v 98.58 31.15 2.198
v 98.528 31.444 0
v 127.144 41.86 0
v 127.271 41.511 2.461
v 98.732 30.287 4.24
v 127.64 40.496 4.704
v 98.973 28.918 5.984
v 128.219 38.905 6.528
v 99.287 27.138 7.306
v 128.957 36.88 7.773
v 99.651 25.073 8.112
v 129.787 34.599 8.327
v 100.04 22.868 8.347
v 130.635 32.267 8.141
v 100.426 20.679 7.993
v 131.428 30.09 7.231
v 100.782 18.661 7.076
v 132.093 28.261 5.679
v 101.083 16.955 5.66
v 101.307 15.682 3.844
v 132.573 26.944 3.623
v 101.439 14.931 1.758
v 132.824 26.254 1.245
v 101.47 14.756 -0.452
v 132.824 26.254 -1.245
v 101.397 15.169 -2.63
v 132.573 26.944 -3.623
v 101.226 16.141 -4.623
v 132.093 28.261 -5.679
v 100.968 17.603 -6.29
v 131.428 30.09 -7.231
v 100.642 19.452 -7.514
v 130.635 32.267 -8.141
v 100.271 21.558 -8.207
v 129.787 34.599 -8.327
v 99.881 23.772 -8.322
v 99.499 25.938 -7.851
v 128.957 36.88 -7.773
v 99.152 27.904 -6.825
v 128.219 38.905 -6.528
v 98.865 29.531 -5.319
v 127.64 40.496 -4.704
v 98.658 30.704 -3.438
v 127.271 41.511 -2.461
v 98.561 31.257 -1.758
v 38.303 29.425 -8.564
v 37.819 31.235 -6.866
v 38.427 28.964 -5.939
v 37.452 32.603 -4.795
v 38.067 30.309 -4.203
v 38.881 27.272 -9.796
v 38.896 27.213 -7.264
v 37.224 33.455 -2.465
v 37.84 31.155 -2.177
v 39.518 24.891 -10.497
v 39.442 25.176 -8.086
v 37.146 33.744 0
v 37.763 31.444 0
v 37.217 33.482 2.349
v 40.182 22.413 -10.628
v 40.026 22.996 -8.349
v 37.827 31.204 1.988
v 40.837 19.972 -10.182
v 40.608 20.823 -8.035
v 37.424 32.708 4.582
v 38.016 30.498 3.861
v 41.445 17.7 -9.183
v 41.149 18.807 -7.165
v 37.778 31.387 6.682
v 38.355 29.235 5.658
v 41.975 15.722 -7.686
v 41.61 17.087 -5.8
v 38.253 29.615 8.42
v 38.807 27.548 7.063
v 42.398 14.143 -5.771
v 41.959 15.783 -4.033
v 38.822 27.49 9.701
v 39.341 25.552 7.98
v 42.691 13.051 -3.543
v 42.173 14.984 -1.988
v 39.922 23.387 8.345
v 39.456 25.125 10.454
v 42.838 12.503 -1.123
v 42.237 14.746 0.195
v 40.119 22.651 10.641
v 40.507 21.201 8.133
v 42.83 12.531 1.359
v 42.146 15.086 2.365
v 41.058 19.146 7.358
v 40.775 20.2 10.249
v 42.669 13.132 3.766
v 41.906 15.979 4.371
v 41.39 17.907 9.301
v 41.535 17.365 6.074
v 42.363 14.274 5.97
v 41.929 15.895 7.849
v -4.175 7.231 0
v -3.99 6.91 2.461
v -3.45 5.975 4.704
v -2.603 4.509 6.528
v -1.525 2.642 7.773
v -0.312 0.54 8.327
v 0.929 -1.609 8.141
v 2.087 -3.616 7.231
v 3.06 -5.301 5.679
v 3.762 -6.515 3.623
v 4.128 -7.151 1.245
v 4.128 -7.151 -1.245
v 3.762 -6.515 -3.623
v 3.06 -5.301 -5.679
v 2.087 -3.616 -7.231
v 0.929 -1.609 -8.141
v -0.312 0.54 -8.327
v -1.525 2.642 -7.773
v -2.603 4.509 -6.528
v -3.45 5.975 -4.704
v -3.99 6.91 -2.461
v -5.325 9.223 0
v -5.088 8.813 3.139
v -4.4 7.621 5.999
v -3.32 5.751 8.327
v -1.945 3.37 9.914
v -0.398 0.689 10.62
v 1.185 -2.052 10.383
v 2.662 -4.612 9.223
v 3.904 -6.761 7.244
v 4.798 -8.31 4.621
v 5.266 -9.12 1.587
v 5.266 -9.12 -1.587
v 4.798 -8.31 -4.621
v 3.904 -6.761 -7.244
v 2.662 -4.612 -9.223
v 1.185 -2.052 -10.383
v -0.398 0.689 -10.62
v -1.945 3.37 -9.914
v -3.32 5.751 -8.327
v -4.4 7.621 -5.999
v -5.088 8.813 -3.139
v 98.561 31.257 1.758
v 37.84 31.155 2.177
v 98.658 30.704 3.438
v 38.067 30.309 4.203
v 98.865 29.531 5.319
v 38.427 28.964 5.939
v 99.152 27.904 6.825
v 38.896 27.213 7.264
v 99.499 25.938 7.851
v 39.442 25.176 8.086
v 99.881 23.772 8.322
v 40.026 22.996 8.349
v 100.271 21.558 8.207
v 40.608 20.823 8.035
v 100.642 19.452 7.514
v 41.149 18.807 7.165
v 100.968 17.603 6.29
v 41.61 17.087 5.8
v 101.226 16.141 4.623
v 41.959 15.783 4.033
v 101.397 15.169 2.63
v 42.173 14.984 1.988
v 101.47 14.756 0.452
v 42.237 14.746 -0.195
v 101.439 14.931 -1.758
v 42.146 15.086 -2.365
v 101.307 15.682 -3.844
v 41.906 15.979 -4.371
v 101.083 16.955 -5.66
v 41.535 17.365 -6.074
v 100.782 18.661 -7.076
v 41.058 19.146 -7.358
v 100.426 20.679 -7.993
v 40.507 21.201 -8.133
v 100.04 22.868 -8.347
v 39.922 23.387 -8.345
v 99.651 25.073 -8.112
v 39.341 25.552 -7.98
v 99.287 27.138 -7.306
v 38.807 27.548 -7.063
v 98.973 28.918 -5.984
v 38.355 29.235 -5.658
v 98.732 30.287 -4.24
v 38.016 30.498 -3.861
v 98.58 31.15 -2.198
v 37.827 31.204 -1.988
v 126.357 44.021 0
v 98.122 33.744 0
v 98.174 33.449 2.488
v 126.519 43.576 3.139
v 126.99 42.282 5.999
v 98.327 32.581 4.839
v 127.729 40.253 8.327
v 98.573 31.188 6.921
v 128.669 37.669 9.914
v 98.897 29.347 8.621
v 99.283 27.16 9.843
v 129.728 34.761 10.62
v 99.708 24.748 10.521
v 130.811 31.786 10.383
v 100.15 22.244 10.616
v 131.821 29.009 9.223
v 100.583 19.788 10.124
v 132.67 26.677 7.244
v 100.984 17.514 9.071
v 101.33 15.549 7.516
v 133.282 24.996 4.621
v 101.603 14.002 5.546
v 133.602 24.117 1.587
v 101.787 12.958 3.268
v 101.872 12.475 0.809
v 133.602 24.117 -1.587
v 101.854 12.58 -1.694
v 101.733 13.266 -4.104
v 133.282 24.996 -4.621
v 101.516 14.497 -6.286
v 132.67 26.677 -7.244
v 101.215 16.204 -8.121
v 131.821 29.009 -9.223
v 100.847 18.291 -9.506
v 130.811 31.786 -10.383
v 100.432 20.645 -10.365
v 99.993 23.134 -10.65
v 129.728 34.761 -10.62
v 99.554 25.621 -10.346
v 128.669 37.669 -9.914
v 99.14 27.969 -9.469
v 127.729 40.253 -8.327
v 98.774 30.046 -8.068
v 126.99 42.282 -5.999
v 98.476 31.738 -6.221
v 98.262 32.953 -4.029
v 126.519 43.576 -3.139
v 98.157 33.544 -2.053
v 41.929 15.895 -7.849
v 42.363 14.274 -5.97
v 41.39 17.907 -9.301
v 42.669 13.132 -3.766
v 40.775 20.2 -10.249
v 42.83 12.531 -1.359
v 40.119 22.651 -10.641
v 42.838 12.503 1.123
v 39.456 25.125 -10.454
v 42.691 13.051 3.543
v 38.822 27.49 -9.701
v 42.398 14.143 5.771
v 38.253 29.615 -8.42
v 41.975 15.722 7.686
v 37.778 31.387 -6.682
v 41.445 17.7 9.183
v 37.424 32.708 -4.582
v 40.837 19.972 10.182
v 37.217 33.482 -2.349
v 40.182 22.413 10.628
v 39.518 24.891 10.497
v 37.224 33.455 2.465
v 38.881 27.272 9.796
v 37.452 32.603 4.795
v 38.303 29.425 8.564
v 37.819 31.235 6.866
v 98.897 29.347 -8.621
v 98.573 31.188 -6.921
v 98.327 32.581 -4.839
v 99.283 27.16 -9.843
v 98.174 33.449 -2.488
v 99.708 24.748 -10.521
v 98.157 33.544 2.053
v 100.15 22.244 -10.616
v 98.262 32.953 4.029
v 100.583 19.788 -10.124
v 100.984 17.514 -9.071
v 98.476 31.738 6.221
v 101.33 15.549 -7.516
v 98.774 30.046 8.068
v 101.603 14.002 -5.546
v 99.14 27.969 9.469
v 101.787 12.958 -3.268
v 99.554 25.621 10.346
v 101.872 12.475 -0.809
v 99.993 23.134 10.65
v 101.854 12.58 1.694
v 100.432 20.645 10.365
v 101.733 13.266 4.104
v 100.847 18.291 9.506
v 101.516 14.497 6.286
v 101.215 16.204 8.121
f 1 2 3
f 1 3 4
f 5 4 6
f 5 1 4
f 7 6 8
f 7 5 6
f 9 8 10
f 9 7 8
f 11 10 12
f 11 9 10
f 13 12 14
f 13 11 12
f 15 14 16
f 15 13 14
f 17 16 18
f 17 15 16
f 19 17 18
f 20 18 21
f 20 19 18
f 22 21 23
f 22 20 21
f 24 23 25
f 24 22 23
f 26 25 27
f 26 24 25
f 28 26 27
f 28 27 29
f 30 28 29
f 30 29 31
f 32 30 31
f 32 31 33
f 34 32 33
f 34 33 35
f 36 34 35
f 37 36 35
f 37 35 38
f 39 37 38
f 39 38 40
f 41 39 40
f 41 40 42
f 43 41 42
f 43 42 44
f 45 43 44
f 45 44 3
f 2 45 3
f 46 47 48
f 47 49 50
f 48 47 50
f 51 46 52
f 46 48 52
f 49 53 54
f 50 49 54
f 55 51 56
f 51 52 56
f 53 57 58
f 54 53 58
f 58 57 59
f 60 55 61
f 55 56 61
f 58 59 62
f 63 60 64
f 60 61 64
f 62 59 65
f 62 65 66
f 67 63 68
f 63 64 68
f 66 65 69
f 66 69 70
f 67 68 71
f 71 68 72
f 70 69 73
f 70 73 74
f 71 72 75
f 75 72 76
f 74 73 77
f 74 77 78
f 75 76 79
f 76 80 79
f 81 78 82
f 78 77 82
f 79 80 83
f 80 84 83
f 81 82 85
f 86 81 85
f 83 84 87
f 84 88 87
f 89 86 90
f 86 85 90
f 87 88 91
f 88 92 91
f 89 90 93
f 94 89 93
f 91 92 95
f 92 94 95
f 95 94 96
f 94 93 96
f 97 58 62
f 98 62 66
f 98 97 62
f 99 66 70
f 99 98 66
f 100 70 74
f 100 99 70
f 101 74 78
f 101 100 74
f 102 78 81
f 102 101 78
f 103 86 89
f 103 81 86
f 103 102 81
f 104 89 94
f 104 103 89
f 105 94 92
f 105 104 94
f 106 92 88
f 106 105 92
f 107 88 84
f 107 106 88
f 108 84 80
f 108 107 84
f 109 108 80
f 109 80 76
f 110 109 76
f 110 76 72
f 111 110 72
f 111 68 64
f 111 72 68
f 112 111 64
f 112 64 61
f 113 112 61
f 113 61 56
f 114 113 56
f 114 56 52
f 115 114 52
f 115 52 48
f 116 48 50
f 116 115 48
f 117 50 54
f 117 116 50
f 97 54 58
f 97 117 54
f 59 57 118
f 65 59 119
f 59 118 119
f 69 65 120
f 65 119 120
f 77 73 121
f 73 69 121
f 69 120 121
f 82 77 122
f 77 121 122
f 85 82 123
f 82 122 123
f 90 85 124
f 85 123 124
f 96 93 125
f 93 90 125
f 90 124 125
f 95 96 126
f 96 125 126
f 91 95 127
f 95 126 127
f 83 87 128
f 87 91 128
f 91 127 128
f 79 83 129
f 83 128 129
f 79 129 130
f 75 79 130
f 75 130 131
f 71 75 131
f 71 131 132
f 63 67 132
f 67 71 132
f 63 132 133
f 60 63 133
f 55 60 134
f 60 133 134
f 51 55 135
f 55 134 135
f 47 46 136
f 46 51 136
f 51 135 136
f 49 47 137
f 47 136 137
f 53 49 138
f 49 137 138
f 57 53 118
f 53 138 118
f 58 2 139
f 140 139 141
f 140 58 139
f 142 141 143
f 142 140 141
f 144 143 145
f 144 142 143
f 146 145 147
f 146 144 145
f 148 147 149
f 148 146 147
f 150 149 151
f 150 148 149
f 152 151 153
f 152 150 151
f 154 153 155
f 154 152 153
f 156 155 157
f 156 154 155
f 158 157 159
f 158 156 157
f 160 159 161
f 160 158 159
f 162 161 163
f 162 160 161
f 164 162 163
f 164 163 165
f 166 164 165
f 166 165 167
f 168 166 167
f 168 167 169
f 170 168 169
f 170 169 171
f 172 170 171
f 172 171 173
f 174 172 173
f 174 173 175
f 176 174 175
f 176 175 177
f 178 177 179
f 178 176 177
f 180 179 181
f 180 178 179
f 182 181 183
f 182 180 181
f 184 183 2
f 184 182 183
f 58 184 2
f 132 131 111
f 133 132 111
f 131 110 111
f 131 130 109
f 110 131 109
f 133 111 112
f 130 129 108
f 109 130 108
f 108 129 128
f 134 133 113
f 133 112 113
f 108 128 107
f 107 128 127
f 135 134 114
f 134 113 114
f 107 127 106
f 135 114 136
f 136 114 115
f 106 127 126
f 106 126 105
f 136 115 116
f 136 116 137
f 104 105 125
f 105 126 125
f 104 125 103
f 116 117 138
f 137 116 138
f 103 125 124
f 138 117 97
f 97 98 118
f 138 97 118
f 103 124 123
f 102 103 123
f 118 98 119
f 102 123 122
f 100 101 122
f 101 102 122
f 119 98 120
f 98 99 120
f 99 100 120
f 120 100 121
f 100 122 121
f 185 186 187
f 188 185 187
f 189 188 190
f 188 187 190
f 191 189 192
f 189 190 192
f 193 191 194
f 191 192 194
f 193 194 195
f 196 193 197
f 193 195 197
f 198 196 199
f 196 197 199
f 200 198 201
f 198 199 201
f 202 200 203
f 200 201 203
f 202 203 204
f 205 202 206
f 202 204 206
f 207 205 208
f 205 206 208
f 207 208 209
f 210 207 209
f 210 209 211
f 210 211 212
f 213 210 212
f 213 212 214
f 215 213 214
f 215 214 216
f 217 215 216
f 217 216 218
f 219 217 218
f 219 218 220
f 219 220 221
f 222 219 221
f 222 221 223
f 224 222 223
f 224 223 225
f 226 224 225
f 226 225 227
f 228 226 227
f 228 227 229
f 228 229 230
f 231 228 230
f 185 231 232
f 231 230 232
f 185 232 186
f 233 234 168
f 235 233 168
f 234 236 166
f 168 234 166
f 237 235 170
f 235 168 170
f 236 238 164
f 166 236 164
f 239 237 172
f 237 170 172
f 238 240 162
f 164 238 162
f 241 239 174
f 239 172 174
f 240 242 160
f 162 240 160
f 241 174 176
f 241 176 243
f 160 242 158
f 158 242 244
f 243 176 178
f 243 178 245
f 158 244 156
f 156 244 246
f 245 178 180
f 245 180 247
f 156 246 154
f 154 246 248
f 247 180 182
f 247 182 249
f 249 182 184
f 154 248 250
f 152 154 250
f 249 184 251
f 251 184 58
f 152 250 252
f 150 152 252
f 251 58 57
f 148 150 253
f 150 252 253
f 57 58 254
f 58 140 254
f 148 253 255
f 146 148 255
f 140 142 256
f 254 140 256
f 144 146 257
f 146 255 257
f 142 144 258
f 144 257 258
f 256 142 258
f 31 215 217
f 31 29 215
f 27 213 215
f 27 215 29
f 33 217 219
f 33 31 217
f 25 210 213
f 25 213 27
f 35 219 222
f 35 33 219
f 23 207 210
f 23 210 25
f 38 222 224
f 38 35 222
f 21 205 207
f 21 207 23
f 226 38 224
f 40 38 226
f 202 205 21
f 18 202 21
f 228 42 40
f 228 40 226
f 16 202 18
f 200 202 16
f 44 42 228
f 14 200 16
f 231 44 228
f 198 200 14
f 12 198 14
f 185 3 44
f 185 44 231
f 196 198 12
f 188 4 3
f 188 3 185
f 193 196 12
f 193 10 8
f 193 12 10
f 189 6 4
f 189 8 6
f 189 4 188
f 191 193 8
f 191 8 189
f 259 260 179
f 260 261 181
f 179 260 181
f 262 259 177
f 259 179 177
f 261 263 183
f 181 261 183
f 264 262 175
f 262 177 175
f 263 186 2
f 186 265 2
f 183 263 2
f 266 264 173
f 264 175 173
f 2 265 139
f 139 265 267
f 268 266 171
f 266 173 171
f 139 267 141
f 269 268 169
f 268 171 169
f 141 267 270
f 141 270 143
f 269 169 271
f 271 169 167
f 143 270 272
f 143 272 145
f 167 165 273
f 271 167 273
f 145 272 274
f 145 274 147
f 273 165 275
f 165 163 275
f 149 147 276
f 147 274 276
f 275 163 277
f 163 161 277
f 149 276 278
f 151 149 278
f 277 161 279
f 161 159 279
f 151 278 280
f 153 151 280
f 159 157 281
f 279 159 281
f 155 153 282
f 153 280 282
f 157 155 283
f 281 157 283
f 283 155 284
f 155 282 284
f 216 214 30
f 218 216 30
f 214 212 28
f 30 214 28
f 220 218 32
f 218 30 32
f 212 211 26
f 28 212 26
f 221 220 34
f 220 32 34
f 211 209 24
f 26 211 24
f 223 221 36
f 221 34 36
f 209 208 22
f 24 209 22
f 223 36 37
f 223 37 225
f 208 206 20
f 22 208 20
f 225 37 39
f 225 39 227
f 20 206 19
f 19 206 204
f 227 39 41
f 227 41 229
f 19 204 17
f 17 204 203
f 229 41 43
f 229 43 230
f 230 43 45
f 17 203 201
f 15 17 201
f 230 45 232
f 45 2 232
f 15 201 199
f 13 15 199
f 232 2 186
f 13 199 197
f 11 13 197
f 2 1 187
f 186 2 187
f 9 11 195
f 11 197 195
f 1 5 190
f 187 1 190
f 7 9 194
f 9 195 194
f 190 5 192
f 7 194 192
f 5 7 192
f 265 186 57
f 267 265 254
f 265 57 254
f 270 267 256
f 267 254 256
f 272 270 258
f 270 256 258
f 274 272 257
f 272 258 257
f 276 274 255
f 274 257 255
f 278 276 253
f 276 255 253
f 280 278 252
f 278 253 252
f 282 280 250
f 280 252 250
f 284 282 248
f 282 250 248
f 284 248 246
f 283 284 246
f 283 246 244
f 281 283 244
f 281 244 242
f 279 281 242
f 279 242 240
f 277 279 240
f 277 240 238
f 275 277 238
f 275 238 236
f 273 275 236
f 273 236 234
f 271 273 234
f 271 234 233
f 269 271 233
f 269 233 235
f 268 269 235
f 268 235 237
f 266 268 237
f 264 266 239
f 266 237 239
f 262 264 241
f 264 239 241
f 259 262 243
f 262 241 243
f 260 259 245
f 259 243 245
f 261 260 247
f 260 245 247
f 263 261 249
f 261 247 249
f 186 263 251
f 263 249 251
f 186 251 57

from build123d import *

# Parameters (mm, degrees)
SKETCH1_R                    = 10.65
SKETCH1_R_2                  = 8.35
TUBER_A_21_3_X_2_3_1_DEPTH   = 51.223704653
SKETCH1_ON_SEGMENT_2_R       = 10.65
SKETCH1_ON_SEGMENT_2_R_2     = 8.35
TUBER_A_21_3_X_2_3_1_2_DEPTH = 68.691409798
SKETCH1_ON_SEGMENT_3_R       = 10.65
SKETCH1_ON_SEGMENT_3_R_2     = 8.35
TUBER_A_21_3_X_2_3_1_3_DEPTH = 35.581059854


with BuildPart() as part:
    # Sketch1 → Tubería 21.3 X 2.3(1) (new body)
    with BuildSketch(Plane(origin=(0, 0, 0), x_dir=(-0.5, 0.866025404, 0), z_dir=(0.866025404, 0.5, 0))):
        Circle(SKETCH1_R)
        Circle(SKETCH1_R_2, mode=Mode.SUBTRACT)
    extrude(amount=TUBER_A_21_3_X_2_3_1_DEPTH)

    # Tubería 21.3 X 2.3(1) mitre 1
    split(bisect_by=Plane(origin=(40, 23.094010768, 0), x_dir=(0.258819045, -0.965925826, 0), z_dir=(-0.965925826, -0.258819045, 0)), keep=Keep.TOP)


with BuildPart() as body_2:
    # Sketch1 on segment 2 (carried to segment 2) → Tuber_a 21.3 X 2.3_1 2 (new body)
    with BuildSketch(Plane(origin=(34.964316882, 23.094010768, 0), x_dir=(0, 1, 0), z_dir=(1, 0, 0))):
        Circle(SKETCH1_ON_SEGMENT_2_R)
        Circle(SKETCH1_ON_SEGMENT_2_R_2, mode=Mode.SUBTRACT)
    extrude(amount=TUBER_A_21_3_X_2_3_1_2_DEPTH)

    # Tuber_a 21.3 X 2.3_1 2 mitre 1
    split(bisect_by=Plane(origin=(40, 23.094010768, 0), x_dir=(-0.258819045, 0.965925826, 0), z_dir=(0.965925826, 0.258819045, 0)), keep=Keep.TOP)

    # Tuber_a 21.3 X 2.3_1 2 mitre 2
    split(bisect_by=Plane(origin=(100, 23.094010768, 0), x_dir=(0.173648178, -0.984807753, 0), z_dir=(-0.984807753, -0.173648178, 0)), keep=Keep.TOP)


with BuildPart() as body_3:
    # Sketch1 on segment 3 (carried to segment 3) → Tuber_a 21.3 X 2.3_1 3 (new body)
    with BuildSketch(Plane(origin=(96.564740615, 21.843678604, 0), x_dir=(-0.342020143, 0.939692621, 0), z_dir=(0.939692621, 0.342020143, 0))):
        Circle(SKETCH1_ON_SEGMENT_3_R)
        Circle(SKETCH1_ON_SEGMENT_3_R_2, mode=Mode.SUBTRACT)
    extrude(amount=TUBER_A_21_3_X_2_3_1_3_DEPTH)

    # Tuber_a 21.3 X 2.3_1 3 mitre 1
    split(bisect_by=Plane(origin=(100, 23.094010768, 0), x_dir=(-0.173648178, 0.984807753, 0), z_dir=(0.984807753, 0.173648178, 0)), keep=Keep.TOP)


solid = Compound([part.part, body_2.part, body_3.part])
